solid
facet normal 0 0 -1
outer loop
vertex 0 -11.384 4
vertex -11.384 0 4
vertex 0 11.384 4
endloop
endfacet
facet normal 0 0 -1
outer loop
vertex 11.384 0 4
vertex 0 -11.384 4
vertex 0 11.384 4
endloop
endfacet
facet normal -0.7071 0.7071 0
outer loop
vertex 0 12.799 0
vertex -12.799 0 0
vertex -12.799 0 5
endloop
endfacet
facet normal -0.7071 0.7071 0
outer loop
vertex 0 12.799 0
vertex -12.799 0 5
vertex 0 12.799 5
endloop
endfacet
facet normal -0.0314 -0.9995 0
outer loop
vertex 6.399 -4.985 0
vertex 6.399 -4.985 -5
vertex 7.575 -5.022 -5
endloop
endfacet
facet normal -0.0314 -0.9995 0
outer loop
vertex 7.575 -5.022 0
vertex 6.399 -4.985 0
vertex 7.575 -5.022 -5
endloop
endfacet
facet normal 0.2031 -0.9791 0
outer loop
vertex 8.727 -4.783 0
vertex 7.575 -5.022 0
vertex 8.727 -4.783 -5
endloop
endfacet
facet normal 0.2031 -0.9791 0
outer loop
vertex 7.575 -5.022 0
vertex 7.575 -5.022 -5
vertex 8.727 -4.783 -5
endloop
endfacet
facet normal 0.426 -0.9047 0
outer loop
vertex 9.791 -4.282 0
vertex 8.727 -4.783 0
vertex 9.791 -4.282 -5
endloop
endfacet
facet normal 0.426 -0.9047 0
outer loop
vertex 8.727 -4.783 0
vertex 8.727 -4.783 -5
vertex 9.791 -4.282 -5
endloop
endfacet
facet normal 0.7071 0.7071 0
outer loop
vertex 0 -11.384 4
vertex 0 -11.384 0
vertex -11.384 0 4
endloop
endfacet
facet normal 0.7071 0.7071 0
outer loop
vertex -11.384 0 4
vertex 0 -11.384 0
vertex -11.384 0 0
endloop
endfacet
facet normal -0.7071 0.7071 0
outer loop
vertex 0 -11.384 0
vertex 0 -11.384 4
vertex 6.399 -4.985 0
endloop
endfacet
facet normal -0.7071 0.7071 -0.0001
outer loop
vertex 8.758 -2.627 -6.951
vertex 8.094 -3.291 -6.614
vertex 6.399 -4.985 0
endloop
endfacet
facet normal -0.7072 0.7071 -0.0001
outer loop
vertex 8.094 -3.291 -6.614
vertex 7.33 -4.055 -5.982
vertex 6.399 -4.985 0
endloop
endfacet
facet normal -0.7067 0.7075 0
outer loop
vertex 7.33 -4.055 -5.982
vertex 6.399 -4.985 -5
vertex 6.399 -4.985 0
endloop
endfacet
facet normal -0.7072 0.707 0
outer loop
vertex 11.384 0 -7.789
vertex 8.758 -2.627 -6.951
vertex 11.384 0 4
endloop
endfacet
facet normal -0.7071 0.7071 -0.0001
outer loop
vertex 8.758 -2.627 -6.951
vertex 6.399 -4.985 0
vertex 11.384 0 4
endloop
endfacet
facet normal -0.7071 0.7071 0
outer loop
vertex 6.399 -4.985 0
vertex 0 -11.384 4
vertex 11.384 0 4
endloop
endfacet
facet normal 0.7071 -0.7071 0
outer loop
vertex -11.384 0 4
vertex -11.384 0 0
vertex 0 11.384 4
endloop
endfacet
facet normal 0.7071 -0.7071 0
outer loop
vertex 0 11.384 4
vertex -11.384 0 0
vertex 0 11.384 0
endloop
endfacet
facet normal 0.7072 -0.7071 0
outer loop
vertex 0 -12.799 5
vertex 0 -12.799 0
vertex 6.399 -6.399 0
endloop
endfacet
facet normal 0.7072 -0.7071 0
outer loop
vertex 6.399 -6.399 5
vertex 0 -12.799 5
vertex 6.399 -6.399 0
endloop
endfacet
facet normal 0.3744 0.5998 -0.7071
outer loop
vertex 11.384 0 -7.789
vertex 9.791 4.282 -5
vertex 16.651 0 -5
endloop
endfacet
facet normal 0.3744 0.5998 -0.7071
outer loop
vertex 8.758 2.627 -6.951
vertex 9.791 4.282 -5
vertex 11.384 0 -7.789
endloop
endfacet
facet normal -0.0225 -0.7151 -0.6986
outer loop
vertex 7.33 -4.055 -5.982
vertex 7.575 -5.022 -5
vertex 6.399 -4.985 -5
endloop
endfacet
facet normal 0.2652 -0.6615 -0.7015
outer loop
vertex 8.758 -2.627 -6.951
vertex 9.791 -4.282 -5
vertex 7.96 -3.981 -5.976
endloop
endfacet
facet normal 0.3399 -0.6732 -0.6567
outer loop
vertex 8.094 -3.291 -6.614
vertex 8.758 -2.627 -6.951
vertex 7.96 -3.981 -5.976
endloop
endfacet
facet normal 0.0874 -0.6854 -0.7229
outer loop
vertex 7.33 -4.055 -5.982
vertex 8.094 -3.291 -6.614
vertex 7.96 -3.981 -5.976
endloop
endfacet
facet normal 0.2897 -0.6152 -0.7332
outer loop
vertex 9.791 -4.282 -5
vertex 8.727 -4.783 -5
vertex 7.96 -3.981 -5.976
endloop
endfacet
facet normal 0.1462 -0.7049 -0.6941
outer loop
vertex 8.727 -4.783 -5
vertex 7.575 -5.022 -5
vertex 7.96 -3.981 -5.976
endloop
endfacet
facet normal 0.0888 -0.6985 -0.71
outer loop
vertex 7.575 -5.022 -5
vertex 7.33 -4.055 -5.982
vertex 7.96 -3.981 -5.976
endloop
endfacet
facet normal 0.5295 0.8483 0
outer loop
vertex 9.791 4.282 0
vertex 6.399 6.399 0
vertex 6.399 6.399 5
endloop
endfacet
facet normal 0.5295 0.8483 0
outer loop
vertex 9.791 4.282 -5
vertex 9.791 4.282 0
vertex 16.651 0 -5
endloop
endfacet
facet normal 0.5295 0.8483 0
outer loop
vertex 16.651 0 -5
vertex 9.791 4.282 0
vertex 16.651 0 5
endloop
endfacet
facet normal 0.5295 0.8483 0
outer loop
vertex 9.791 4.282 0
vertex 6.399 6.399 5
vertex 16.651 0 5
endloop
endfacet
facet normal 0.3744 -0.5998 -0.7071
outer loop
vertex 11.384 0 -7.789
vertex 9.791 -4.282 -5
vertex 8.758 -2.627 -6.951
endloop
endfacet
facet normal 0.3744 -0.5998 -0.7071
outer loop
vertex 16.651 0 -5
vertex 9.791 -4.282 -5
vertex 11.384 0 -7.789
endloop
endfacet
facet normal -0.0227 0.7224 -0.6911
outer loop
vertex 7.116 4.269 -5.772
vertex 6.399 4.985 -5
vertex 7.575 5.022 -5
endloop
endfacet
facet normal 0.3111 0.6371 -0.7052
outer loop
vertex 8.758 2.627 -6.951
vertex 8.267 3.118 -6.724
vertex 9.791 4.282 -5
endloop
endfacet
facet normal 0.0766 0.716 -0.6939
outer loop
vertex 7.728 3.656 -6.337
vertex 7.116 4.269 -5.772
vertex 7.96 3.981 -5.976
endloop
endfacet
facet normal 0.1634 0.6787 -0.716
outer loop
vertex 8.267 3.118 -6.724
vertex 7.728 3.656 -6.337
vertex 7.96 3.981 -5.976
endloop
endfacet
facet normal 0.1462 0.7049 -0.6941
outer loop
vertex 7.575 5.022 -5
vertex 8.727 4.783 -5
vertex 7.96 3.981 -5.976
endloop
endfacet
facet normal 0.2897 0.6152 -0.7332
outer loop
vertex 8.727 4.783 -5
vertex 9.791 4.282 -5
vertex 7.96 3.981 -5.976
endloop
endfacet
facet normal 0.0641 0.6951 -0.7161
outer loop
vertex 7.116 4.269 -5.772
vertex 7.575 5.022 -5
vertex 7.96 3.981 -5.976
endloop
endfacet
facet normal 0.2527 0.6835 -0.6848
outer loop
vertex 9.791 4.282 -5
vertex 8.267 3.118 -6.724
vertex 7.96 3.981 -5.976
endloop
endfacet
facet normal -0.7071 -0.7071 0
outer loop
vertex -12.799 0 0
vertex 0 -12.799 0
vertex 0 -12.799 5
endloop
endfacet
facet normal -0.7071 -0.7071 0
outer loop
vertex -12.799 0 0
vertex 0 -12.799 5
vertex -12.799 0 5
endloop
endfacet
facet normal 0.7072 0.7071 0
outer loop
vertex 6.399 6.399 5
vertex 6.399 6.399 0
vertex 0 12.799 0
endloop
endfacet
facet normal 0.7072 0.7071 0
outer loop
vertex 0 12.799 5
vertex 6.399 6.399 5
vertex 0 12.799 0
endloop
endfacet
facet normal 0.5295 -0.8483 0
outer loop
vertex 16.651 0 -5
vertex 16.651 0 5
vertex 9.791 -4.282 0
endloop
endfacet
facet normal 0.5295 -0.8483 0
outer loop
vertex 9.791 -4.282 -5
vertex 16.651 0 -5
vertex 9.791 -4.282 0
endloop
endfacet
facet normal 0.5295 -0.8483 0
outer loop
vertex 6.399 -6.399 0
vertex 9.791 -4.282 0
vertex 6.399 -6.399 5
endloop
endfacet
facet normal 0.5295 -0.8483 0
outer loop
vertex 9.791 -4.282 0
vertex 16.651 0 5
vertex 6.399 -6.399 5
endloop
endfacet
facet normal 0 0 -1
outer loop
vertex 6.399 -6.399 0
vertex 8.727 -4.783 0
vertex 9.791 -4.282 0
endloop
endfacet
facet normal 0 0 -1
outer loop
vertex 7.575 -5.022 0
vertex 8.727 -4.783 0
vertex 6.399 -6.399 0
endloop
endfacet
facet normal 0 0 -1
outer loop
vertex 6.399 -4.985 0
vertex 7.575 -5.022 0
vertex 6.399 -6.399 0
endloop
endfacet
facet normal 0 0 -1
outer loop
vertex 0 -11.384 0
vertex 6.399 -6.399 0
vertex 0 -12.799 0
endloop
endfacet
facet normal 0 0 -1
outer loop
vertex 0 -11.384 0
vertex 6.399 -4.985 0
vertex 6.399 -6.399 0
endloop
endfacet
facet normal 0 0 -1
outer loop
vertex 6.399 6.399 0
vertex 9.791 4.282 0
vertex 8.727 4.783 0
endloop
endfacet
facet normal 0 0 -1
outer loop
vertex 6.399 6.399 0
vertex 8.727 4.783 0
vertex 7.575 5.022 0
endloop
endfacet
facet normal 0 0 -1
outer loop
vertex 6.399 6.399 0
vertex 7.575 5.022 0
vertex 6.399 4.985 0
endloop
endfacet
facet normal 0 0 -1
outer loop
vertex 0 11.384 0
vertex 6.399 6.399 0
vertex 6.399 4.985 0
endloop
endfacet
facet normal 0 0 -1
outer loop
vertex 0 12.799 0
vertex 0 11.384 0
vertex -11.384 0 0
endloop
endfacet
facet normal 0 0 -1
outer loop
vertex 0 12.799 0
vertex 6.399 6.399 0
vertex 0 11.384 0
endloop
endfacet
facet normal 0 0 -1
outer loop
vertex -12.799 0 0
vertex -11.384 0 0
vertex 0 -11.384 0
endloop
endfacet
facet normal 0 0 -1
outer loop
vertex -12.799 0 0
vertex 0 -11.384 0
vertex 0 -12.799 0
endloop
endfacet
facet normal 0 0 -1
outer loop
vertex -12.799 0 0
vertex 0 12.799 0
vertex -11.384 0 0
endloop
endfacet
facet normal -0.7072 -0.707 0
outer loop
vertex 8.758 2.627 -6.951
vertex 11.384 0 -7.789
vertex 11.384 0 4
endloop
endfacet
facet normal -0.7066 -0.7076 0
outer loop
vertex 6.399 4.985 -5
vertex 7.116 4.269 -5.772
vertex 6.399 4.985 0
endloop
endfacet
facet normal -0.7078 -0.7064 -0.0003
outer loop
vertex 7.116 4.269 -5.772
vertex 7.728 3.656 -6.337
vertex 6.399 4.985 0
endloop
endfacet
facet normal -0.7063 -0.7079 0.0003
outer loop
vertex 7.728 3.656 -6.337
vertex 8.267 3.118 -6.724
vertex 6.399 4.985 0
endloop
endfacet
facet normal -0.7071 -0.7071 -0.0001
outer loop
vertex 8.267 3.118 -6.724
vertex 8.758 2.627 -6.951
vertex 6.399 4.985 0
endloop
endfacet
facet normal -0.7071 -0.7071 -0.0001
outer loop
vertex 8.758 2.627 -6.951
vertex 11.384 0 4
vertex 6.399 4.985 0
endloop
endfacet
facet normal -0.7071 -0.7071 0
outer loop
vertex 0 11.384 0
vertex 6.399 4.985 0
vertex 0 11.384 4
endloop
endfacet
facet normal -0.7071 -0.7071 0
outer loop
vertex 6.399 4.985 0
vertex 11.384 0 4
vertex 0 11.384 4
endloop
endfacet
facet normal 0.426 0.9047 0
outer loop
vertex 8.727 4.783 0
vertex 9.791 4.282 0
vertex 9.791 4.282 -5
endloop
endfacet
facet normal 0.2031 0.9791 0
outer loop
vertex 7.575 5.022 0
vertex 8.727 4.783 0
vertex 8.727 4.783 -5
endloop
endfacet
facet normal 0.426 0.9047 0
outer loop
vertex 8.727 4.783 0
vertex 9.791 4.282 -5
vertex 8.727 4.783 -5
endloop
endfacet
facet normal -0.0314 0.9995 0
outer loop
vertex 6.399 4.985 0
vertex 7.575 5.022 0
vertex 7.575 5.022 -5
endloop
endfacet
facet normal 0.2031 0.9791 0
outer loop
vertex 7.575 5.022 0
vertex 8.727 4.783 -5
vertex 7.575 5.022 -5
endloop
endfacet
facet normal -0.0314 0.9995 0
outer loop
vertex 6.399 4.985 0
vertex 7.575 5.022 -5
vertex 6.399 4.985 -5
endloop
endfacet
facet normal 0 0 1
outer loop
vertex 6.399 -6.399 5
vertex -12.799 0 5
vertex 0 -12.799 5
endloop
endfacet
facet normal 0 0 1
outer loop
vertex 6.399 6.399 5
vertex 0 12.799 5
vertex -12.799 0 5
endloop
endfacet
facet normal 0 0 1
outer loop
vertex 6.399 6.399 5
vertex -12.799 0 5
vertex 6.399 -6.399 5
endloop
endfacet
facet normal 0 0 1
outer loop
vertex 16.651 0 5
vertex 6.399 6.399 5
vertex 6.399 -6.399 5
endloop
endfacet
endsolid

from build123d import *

# Parameters (mm, degrees)
F1_W         = 18.1
F1_H         = 18.1
F2_DEPTH     = 5
F3_W         = 16.1
F3_H         = 16.1
F4_DEPTH     = 4
F5_ANGLE     = 45
F7_DEPTH     = 5
F9_DEPTH     = 8
F10_T1_DEPTH = 17.995241473
F11_T1_DEPTH = 15.801577482
F11_T3_DEPTH = 15.801577482
F11_T6_ANGLE = 128.9448568851
F11_T8_ANGLE = 128.9448568851


# Not quite as in the source:
# - a fillet or chamfer that OpenCascade refuses, or shapes differently, is made with other operations: its cross-section is extruded or revolved along the edge and cut away or added


with BuildPart() as f2:
    # F1 (on Top) → F2 (new body)
    with BuildSketch(Plane.XY):
        Rectangle(F1_W, F1_H)
    extrude(amount=F2_DEPTH)

    # F3 (on Top) → F4 (cut)
    with BuildSketch(Plane.XY):
        Rectangle(F3_W, F3_H)
    extrude(amount=F4_DEPTH, mode=Mode.SUBTRACT)


with BuildPart() as f2_1:
    # F5: moved
    add(f2.part.rotate(Axis((0, 0, 23.8891355693), (0, 0, 1)), F5_ANGLE))

    # F6 (on face) → F7 (join)
    with BuildSketch(Plane.XY.offset(5)):
        Polygon((12.7986327395, 0), (6.3993163697, -6.3993163697), (16.6505072266, 0), (6.3993163697, 6.3993163697), align=None)
    extrude(amount=-F7_DEPTH)

    # F8 (on face) → F9 (join)
    with BuildSketch(Plane(origin=(0, 0, 0), x_dir=(1, 0, 0), z_dir=(0, 0, -1))):
        Polygon((16.6505072266, 0), (6.3993163697, 6.3993163697), (6.3993163697, 4.9851028074), (11.3844191771, 0), (6.3993163697, -4.9851028074), (6.3993163697, -6.3993163697), align=None)
    extrude(amount=F9_DEPTH)

    # F10: fillet of radius 5 on 2 edges, made by hand

    # F10_s2 → F10_t1 (cut)
    with BuildSketch(Plane.XY.offset(-17.995241473)):
        with BuildLine():
            ThreePointArc((6.3993163697, -4.9851028074), (8.1578886795, -4.9366807501), (9.7908366557, -4.2821563649))
            Line((9.7908366557, -4.2821563649), (6.3993163697, -6.3993163697))
            Line((6.3993163697, -6.3993163697), (6.3993163697, -4.9851028074))
        make_face()
        with BuildLine():
            ThreePointArc((9.7908366557, 4.2821563649), (8.1578886795, 4.9366807501), (6.3993163697, 4.9851028074))
            Line((6.3993163697, 4.9851028074), (6.3993163697, 6.3993163697))
            Line((6.3993163697, 6.3993163697), (9.7908366557, 4.2821563649))
        make_face()
    extrude(amount=F10_T1_DEPTH, mode=Mode.SUBTRACT)

    # F11: chamfer of 3 on 2 edges, made by hand

    # F11_s2 → F11_t1 (cut)
    with BuildSketch(Plane(origin=(5.1217894323, -3.1972822879, 0), x_dir=(0, 0, 1), z_dir=(0.8482837296, -0.5295419852, 0))):
        Polygon((-5, -8.8171426514), (-8, -5.8171426514), (-8, -8.8171426514), align=None)
    extrude(amount=F11_T1_DEPTH, mode=Mode.SUBTRACT)

    # F11_s4 → F11_t3 (cut)
    with BuildSketch(Plane(origin=(18.5260105123, 11.564880997, 0), x_dir=(0, 0, 1), z_dir=(-0.8482837296, -0.5295419852, 0))):
        Polygon((-5, -8.8171426514), (-8, -5.8171426514), (-8, -8.8171426514), align=None)
    extrude(amount=F11_T3_DEPTH, mode=Mode.SUBTRACT)

    # F11_s5 → F11_t6 (revolve, cut)
    with BuildSketch(Plane(origin=(5.1217894331, 3.1972822878, 0), x_dir=(0, 0, 1), z_dir=(0.8482837296, 0.5295419851, 0))):
        Polygon((-8, 5.8171426509), (-5, 8.8171426509), (-8, 8.8171426509), align=None)
    revolve(axis=Axis((7.1431267295, -0.0407377158, -8), (0, 0, -1)), revolution_arc=F11_T6_ANGLE, mode=Mode.SUBTRACT)

    # F11_s7 → F11_t8 (revolve, cut)
    with BuildSketch(Plane(origin=(0.1002908696, -0.8203136168, 0), x_dir=(0, 0, 1), z_dir=(0.1213555739, -0.9926090996, 0))):
        Polygon((-8, -5.0952763393), (-5, -2.0952763393), (-8, -2.0952763393), align=None)
    revolve(axis=Axis((7.1431267295, 0.0407377158, -8), (0, 0, -1)), revolution_arc=F11_T8_ANGLE, mode=Mode.SUBTRACT)


solid = f2_1.part
